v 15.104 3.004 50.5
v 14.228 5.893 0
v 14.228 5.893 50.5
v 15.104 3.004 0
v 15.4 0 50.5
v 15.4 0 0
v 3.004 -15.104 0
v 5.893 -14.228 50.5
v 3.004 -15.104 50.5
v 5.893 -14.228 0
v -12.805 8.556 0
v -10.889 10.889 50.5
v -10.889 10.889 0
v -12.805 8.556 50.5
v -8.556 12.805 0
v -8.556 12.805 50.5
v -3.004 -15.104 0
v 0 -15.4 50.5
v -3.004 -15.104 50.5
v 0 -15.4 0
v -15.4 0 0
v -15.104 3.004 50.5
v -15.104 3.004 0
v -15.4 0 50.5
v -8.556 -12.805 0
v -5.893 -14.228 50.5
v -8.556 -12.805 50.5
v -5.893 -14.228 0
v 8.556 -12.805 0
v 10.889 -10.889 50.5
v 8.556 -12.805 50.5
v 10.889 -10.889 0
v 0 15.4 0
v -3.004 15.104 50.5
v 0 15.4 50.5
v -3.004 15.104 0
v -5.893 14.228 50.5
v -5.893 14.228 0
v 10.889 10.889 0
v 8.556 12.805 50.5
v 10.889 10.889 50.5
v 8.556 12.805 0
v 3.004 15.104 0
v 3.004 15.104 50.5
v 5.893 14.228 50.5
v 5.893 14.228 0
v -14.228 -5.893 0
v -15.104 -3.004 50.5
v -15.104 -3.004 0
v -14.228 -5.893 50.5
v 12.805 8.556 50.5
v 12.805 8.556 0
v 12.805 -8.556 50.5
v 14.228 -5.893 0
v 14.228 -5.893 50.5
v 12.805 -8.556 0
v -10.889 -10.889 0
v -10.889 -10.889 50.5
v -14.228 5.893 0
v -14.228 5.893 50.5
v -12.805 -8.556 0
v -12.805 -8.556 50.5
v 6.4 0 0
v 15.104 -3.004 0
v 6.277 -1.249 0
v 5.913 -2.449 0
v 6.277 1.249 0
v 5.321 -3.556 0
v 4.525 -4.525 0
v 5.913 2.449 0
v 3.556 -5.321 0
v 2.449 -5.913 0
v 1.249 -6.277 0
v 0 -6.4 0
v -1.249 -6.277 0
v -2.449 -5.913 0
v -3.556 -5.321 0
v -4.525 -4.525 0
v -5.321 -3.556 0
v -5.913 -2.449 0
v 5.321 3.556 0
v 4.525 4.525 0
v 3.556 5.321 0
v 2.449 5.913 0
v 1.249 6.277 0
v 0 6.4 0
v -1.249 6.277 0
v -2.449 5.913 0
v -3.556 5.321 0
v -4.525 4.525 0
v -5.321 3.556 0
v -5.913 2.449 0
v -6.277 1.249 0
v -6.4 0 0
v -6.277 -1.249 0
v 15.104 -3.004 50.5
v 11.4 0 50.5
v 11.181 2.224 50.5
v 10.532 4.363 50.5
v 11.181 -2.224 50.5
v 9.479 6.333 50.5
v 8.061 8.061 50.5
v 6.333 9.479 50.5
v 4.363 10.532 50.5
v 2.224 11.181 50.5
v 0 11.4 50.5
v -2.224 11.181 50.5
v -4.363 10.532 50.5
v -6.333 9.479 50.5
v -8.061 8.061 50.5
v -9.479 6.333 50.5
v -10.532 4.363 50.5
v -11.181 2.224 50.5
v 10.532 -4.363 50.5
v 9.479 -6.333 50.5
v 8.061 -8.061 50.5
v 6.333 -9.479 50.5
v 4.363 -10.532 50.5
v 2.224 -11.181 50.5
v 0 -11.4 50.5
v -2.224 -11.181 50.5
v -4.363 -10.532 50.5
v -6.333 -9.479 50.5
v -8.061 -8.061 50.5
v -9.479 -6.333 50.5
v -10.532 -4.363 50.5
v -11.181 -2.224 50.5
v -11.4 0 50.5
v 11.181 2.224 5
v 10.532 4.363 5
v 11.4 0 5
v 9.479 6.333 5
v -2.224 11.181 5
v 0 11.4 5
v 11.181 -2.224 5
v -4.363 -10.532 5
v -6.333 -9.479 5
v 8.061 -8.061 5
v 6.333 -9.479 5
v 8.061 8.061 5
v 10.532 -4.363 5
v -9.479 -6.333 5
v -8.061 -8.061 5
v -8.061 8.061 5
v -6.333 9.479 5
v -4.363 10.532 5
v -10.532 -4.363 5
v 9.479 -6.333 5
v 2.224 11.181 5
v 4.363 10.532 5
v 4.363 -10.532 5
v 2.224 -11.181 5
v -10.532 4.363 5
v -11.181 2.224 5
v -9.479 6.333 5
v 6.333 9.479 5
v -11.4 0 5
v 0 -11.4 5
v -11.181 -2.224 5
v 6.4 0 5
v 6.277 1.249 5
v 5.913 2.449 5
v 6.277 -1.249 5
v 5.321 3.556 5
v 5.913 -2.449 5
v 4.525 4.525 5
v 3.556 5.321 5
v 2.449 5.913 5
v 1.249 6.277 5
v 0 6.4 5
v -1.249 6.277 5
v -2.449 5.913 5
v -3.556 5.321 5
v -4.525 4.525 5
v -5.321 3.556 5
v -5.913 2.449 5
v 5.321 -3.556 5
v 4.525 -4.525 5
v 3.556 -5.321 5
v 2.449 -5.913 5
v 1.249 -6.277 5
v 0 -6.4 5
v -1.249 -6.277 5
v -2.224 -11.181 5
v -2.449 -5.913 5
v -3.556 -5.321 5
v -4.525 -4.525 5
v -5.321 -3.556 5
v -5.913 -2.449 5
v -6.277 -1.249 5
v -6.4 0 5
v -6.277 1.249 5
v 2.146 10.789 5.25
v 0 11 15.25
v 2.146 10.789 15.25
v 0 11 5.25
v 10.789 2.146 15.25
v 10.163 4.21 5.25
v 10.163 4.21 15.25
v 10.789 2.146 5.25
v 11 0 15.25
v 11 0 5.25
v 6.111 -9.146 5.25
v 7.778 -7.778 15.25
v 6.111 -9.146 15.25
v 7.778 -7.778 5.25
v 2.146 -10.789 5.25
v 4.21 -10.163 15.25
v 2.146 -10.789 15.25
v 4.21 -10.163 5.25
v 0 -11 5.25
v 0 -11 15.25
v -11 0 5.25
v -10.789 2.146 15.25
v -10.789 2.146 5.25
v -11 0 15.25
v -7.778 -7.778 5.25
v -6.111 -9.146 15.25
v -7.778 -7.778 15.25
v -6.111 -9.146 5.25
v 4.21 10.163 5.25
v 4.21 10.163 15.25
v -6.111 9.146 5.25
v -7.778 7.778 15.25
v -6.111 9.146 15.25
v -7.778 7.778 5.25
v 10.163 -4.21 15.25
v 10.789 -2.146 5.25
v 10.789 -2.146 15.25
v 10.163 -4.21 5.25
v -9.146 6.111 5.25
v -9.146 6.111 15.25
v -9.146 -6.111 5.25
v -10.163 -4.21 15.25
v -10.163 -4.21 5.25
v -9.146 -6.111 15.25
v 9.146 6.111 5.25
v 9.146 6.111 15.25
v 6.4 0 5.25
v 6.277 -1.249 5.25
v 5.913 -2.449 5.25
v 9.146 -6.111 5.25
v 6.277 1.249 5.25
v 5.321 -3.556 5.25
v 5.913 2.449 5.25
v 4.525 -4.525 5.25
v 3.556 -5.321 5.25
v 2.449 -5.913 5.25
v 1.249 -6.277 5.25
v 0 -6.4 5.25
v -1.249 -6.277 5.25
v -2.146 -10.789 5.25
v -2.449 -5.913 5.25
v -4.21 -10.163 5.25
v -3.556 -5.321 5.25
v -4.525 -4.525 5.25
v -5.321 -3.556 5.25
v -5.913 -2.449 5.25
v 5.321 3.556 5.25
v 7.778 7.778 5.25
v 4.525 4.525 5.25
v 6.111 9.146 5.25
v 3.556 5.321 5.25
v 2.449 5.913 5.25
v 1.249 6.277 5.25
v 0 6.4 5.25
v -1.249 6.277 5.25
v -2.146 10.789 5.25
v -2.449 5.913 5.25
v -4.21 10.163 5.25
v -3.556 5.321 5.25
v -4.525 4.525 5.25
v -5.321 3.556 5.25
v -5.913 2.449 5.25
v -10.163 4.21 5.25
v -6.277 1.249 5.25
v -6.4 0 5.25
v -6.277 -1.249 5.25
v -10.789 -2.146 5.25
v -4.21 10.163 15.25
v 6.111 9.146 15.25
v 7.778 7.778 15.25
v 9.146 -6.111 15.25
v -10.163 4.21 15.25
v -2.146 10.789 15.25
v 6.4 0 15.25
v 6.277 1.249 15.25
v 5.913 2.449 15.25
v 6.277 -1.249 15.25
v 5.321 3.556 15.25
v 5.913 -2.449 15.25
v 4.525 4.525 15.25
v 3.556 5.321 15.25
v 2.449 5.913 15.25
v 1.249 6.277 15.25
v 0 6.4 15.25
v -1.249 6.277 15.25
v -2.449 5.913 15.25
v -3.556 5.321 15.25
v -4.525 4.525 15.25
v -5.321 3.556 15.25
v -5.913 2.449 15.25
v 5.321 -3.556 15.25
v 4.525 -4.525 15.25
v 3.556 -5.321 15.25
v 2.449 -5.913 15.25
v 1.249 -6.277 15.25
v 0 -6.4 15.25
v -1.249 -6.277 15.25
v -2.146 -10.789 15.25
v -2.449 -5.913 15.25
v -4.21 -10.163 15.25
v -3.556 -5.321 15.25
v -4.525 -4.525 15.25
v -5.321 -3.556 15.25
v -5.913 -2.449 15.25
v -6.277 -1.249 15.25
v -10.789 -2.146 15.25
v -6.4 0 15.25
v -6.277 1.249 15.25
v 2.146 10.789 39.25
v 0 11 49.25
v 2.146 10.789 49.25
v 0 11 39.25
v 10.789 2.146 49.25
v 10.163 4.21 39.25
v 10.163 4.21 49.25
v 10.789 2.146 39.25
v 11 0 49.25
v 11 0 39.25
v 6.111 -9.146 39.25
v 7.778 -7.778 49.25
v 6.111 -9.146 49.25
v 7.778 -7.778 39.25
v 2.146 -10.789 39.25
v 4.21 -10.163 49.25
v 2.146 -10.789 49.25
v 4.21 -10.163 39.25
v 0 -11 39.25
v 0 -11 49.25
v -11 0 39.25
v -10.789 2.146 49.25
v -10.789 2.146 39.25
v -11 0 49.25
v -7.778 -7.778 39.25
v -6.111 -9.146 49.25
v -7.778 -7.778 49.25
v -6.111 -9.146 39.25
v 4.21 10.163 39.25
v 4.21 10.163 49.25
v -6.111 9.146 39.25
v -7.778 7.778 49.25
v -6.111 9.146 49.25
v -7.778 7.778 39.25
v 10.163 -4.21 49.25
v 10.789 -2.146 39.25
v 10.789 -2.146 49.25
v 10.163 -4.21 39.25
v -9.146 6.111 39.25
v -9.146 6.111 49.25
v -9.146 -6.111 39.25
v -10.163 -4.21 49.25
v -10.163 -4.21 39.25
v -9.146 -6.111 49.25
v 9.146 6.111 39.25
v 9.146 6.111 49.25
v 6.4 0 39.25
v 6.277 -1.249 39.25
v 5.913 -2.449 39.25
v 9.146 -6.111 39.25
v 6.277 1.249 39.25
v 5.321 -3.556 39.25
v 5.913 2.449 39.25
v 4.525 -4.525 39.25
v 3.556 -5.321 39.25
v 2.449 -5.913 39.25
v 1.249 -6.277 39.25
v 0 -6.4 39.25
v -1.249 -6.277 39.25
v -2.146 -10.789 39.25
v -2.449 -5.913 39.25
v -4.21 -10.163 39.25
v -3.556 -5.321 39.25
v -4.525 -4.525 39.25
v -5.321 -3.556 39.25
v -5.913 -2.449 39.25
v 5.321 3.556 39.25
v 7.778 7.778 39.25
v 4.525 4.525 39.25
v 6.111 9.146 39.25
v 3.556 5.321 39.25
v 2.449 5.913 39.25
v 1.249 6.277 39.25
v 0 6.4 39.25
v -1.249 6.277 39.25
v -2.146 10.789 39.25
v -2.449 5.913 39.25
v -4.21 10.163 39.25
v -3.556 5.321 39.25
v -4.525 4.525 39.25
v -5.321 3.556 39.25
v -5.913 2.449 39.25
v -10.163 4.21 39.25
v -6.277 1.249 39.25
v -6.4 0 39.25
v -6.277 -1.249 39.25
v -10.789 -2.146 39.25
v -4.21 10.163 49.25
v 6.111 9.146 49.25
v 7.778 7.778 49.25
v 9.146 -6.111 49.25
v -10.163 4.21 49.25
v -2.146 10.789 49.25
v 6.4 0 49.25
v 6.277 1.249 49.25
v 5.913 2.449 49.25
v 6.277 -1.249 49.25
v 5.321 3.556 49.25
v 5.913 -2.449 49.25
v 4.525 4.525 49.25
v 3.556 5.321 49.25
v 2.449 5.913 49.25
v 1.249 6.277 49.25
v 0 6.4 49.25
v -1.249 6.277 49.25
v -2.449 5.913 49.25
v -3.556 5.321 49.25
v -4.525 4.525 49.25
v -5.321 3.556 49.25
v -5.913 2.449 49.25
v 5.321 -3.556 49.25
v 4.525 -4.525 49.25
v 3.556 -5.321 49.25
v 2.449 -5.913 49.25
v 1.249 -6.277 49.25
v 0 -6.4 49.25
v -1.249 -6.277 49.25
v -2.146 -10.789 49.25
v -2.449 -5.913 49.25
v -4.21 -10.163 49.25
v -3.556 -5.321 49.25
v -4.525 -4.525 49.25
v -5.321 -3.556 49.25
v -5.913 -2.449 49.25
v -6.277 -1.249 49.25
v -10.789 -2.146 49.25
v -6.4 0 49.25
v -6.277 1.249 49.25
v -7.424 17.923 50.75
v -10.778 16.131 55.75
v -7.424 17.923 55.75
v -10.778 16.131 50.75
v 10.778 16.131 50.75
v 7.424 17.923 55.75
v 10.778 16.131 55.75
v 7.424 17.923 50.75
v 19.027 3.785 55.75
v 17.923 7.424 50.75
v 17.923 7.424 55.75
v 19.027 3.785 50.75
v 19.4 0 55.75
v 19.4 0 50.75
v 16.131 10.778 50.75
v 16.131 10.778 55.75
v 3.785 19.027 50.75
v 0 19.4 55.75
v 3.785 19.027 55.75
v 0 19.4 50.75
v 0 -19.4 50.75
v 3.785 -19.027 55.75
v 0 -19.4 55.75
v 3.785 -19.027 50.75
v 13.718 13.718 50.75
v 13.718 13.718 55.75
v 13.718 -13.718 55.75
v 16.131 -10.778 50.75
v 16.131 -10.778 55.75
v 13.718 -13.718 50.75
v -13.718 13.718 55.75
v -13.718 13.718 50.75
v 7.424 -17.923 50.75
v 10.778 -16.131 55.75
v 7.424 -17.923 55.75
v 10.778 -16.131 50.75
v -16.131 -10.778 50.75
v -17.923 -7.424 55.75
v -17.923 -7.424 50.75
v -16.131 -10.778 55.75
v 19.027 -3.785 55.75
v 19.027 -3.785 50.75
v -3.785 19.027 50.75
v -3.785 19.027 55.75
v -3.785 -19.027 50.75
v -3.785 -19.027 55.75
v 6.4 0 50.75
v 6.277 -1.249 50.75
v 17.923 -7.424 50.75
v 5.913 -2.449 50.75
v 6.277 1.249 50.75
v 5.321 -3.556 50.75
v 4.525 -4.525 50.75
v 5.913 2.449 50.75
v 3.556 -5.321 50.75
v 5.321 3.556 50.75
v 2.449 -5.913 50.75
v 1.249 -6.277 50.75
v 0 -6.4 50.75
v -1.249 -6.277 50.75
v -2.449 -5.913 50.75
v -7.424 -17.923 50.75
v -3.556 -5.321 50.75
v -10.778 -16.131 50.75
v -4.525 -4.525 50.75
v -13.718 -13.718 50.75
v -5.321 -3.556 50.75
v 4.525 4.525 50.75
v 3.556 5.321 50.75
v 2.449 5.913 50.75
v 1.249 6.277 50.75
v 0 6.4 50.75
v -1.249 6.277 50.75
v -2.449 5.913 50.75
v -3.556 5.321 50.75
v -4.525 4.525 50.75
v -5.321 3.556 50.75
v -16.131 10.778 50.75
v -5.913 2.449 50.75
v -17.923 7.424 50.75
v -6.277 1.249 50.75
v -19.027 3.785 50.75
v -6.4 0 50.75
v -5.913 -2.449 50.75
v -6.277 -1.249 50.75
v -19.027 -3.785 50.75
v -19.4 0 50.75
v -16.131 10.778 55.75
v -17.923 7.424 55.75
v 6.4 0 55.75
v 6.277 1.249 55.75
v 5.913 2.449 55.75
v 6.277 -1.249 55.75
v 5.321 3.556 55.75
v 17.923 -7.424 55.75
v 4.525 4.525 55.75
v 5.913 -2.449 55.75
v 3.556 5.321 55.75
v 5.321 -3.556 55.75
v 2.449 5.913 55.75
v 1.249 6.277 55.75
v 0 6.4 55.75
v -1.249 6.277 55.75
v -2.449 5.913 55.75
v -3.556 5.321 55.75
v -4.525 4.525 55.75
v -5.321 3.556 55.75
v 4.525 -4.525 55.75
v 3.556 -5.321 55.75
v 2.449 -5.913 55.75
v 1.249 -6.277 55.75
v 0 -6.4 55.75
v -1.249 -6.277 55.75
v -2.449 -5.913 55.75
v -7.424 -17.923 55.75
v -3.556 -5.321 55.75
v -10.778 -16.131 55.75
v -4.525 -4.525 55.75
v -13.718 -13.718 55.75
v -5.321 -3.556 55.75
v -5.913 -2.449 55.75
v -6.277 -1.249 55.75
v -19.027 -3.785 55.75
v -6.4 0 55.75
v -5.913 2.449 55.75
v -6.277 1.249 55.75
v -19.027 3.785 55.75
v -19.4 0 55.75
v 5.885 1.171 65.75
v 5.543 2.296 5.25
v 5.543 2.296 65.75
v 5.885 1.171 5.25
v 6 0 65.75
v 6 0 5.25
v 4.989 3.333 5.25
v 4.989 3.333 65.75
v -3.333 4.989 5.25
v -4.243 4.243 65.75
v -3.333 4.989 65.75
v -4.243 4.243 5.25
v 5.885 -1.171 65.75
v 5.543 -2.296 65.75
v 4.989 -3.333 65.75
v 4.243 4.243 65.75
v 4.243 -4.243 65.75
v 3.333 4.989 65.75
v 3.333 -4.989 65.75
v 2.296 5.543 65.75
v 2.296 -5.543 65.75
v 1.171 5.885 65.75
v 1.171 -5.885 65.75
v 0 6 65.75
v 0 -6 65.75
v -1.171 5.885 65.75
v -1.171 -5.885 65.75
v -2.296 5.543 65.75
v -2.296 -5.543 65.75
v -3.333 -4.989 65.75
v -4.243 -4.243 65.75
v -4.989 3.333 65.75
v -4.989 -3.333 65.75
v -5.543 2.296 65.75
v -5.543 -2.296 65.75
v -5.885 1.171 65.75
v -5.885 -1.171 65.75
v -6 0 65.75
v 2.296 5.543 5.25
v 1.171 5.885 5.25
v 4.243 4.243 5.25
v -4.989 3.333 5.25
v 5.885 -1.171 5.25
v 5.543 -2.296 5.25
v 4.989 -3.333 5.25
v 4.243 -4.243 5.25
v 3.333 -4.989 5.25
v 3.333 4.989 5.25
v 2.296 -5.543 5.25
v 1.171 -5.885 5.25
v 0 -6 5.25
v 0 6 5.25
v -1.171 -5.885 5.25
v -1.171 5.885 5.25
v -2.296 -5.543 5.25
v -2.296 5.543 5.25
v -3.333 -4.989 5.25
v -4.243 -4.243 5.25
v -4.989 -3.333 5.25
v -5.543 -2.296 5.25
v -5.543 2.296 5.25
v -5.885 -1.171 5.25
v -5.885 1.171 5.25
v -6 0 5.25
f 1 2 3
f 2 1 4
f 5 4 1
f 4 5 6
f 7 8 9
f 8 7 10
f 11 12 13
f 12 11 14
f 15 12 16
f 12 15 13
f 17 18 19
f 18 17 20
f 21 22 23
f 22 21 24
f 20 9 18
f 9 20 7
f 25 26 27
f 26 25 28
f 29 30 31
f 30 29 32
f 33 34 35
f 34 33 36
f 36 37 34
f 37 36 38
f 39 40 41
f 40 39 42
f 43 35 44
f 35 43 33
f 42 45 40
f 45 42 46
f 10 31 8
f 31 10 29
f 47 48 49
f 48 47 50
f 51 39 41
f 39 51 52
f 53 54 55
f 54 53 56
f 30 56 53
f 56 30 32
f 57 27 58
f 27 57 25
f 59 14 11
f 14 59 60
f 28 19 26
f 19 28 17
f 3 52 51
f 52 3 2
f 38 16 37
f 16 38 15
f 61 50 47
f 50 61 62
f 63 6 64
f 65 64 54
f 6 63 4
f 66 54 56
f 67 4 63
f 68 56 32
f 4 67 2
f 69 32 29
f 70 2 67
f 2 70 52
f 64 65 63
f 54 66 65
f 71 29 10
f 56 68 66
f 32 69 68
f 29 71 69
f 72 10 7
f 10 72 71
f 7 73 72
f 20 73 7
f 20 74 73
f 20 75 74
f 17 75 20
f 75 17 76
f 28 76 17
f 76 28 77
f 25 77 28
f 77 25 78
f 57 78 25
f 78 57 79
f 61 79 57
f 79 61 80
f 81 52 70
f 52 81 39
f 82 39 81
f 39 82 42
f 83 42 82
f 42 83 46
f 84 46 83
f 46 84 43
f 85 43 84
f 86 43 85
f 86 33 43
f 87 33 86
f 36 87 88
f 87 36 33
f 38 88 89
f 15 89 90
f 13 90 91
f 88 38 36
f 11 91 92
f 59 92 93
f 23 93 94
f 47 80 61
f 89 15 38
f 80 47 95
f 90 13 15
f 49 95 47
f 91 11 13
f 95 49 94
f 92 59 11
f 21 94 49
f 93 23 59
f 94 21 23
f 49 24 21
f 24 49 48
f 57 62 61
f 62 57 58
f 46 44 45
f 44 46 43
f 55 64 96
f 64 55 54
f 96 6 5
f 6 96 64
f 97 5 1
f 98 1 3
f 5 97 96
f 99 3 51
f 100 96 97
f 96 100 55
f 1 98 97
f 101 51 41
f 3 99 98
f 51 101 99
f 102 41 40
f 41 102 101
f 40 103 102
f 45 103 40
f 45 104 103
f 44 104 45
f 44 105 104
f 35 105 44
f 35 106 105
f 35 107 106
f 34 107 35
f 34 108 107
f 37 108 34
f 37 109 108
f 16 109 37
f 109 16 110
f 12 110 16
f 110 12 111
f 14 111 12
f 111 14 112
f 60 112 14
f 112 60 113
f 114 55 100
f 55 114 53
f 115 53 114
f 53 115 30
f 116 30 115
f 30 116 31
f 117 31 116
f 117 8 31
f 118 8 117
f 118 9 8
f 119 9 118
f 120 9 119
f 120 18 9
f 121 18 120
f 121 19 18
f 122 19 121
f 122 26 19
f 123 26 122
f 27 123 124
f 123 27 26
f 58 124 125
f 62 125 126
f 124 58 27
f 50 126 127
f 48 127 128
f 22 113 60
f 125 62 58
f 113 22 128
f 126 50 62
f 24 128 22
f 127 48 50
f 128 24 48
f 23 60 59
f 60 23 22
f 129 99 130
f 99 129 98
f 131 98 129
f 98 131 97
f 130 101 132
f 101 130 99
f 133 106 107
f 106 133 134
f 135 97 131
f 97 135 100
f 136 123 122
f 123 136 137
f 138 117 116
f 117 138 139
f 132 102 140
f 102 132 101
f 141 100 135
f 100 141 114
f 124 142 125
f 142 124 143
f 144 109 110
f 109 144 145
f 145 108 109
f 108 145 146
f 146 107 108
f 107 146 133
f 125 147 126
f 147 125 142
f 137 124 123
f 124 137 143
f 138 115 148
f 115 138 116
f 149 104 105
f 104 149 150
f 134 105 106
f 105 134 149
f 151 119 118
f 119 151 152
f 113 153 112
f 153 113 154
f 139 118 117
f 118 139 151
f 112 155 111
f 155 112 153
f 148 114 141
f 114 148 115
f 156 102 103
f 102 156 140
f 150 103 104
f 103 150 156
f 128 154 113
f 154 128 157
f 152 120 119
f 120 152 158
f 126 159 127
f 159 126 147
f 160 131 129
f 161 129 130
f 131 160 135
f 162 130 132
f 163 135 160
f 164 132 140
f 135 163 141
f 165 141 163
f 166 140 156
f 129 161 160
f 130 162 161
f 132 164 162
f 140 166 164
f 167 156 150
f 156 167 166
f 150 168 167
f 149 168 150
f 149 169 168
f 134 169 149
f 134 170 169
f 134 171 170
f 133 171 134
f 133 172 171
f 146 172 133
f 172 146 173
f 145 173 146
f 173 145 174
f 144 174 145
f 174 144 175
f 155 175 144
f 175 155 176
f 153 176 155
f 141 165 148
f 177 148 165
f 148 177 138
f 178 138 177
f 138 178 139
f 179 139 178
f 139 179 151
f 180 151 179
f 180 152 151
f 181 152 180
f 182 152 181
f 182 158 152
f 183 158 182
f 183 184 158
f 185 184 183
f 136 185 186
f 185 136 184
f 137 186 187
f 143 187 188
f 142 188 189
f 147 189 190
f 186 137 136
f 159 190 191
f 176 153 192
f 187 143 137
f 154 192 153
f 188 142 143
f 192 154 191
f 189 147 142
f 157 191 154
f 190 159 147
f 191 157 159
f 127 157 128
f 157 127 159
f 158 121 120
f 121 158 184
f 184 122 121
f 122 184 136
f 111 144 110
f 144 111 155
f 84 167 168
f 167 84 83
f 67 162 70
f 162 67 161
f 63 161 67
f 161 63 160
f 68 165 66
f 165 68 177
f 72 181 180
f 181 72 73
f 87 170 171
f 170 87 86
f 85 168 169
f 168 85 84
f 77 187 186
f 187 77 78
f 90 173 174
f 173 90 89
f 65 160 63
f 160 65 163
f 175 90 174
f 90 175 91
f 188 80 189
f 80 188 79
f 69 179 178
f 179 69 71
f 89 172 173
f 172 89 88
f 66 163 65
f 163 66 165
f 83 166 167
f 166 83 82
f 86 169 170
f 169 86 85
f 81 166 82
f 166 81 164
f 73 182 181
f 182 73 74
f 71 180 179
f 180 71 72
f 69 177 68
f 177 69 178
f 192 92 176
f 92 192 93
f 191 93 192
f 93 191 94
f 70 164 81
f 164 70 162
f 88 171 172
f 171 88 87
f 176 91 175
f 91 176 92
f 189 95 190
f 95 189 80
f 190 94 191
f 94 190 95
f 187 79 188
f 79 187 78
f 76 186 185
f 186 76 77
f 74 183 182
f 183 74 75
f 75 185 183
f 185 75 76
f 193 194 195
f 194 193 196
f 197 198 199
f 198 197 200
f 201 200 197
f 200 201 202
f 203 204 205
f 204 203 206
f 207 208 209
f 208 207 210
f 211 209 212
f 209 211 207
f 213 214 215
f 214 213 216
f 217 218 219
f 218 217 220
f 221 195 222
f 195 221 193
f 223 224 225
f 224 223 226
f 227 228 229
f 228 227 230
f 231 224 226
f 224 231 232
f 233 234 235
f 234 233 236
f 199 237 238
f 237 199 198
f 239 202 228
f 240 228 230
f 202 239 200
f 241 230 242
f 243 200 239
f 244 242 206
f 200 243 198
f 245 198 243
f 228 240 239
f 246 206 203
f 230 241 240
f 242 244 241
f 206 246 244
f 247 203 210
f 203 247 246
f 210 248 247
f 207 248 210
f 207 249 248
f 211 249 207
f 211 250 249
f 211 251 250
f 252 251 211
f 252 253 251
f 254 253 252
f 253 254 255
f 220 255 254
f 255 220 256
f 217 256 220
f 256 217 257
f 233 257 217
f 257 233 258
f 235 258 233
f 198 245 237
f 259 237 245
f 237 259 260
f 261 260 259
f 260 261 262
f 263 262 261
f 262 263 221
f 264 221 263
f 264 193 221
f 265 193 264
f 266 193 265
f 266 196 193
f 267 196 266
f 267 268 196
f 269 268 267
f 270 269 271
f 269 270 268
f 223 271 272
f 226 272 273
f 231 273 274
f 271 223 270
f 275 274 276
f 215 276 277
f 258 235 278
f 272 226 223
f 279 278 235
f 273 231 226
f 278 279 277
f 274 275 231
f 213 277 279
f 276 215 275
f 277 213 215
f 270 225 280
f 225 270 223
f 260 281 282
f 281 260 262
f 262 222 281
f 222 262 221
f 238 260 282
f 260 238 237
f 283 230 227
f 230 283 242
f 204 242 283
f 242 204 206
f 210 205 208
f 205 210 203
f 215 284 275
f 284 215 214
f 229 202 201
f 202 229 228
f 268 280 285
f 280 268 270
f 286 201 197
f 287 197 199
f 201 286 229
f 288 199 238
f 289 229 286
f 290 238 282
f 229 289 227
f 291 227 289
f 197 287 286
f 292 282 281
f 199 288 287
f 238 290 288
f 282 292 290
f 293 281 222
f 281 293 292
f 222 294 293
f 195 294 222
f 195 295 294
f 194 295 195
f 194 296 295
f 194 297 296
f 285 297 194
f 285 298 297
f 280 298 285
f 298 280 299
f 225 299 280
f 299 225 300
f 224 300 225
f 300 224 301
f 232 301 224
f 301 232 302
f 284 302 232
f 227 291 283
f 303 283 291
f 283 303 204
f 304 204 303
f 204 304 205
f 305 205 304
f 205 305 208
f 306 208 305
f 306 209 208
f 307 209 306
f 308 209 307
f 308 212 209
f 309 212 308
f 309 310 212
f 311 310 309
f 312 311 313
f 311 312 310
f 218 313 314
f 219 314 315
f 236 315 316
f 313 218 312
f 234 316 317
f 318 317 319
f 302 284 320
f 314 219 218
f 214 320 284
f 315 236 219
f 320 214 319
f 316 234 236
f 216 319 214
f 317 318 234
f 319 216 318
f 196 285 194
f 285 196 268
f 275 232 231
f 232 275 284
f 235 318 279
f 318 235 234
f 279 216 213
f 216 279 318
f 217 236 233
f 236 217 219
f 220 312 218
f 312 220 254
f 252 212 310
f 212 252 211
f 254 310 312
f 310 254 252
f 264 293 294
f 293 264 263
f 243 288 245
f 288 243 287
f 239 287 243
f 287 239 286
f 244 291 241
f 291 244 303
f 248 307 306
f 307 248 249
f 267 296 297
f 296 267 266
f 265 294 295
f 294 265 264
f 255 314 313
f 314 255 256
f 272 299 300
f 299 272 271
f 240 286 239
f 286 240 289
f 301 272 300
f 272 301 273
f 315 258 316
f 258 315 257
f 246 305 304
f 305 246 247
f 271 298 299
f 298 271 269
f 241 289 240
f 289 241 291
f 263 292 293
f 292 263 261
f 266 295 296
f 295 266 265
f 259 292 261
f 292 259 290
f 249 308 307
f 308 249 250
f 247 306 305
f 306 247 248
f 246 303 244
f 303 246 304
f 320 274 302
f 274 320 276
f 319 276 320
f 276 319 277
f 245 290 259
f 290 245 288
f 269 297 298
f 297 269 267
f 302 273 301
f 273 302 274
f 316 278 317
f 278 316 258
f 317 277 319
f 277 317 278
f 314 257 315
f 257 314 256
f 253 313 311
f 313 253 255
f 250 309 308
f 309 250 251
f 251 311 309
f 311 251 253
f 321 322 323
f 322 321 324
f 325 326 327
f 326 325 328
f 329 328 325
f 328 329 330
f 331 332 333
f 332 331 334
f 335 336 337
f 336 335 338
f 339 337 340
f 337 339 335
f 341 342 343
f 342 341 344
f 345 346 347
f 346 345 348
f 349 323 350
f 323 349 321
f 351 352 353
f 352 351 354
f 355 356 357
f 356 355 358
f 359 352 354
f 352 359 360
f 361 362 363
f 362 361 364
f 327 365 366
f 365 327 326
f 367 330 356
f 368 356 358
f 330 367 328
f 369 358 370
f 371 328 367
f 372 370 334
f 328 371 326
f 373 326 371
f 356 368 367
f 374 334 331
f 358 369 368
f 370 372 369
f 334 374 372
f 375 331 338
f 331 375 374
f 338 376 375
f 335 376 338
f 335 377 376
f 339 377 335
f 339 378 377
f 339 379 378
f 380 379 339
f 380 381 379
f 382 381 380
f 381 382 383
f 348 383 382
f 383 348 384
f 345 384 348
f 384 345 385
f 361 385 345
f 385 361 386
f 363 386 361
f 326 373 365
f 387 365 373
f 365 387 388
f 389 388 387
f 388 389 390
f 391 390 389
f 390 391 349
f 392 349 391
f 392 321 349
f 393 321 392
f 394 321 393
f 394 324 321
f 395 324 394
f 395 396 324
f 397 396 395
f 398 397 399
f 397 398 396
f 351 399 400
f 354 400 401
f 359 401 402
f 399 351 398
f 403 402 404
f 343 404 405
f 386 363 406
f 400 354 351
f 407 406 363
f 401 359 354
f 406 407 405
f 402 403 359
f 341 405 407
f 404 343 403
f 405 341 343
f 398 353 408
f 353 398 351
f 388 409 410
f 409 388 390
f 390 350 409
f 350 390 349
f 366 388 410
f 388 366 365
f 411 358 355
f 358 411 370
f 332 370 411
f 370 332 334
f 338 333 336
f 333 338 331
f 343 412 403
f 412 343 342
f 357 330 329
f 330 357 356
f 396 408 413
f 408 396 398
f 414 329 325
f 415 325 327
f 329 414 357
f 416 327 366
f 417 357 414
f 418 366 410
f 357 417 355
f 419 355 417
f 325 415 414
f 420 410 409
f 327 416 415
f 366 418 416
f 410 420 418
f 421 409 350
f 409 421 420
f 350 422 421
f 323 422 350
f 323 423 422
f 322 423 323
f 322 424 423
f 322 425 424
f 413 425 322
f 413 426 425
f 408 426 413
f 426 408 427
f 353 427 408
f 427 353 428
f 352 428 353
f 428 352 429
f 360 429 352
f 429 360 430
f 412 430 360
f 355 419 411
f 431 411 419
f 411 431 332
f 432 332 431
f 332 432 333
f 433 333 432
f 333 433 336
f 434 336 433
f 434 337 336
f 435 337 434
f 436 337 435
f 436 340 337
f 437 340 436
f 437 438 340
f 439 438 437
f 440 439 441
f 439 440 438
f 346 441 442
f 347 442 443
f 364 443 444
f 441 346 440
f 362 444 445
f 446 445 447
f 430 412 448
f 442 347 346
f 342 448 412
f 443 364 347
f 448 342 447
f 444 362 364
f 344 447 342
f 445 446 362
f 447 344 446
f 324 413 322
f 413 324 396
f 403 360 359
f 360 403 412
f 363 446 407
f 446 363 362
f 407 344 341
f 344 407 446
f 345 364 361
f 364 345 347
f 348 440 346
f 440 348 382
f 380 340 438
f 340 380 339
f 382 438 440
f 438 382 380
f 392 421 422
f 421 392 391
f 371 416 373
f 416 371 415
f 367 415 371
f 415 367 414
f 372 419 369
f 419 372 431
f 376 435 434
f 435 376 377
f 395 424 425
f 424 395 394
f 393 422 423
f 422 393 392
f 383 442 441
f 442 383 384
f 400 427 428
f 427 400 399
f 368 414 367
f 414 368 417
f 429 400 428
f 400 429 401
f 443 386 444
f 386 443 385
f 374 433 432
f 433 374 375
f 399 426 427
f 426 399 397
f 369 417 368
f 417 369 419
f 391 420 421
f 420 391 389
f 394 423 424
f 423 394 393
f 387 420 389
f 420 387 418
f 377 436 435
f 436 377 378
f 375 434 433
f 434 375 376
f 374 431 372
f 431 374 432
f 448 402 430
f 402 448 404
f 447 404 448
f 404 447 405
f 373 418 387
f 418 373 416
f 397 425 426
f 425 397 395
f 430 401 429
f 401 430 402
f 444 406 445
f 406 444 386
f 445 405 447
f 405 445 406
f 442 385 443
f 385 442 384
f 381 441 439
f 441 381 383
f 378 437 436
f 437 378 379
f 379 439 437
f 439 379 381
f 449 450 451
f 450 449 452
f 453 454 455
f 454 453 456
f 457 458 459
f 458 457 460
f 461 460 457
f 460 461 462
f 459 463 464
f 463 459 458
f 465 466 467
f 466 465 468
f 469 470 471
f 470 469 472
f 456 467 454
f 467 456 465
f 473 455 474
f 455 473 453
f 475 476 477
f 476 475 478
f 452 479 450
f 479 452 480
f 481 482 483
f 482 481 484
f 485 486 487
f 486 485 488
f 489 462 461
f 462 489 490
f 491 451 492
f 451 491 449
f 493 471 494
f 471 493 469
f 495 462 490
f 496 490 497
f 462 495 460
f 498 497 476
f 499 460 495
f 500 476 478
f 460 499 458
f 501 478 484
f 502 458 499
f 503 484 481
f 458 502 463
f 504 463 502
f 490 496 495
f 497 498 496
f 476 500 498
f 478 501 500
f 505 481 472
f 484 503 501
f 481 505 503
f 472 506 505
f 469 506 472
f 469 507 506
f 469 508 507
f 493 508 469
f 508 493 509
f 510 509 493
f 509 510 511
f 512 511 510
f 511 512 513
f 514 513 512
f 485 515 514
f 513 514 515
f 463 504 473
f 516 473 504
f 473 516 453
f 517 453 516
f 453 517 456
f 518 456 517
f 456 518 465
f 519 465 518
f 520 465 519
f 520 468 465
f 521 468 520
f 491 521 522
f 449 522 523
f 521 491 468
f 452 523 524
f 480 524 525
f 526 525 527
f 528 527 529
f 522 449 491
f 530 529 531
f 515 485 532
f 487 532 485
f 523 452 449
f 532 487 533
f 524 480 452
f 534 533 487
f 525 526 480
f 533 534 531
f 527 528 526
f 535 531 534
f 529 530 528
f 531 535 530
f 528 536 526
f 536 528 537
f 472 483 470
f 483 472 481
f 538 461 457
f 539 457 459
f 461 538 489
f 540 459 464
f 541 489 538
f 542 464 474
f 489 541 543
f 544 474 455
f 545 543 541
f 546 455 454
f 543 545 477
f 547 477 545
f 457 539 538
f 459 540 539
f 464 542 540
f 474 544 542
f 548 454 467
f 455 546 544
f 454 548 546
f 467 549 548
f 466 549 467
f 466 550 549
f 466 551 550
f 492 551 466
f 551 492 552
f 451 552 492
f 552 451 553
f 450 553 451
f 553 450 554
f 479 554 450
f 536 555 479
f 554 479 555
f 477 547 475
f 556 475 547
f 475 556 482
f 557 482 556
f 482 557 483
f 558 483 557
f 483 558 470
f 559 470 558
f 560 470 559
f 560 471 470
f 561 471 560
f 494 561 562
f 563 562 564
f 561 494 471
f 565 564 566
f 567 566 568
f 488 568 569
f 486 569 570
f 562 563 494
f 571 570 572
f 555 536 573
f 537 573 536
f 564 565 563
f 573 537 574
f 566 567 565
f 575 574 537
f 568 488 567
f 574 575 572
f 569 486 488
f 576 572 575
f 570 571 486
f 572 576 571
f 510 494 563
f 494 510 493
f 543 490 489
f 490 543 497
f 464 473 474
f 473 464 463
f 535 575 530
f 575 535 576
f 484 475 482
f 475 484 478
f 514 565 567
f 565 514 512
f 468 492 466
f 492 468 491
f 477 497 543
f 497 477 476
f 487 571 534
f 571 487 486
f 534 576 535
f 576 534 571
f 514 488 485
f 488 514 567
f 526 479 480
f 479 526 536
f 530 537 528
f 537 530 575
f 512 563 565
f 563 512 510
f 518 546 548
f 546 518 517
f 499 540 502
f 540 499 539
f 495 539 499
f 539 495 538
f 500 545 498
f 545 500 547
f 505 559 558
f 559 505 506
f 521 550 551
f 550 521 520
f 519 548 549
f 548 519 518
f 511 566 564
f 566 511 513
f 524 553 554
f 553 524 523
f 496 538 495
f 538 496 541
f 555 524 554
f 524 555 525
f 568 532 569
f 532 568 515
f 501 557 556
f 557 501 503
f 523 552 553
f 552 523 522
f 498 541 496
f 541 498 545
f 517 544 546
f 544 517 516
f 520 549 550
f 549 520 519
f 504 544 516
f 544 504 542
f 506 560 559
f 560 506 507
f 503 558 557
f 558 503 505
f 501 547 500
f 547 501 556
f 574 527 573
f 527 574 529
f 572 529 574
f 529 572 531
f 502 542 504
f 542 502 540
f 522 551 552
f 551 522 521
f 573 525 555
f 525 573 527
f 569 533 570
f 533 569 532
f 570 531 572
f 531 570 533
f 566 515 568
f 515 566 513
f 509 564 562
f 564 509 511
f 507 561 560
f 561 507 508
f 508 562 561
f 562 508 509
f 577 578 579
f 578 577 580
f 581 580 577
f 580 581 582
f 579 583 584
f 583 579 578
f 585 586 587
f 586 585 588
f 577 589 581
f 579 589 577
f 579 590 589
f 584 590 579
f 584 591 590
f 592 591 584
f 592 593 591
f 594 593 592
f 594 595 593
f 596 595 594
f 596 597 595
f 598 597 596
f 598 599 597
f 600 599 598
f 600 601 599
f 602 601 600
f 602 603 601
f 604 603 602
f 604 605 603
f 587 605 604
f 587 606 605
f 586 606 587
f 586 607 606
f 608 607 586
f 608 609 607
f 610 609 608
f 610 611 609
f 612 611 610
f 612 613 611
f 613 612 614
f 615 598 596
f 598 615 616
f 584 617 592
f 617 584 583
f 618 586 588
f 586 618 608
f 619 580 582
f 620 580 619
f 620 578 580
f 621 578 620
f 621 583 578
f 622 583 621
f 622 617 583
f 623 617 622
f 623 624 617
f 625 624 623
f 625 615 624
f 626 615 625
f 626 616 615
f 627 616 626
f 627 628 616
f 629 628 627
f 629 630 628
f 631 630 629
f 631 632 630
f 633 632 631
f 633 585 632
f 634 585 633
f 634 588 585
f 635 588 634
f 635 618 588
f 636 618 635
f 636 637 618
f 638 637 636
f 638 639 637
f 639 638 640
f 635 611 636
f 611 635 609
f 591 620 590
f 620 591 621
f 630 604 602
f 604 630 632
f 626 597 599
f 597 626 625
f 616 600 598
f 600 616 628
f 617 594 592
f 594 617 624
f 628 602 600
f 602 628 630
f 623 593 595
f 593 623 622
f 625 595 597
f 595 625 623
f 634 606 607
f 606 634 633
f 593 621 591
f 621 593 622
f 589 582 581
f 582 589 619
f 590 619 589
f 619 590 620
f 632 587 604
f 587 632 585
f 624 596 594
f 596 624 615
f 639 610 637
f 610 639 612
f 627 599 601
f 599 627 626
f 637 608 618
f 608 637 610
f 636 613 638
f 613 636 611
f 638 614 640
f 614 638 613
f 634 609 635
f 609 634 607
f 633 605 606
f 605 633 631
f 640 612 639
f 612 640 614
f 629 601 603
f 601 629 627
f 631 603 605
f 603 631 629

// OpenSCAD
$fn = 32;

// ------------------------------------------------------------------------
// Shaft station: cup d30.8 x 50.5 mm, shaft d12
// Every part is its own module, assembly() places every instance.
// ------------------------------------------------------------------------

// --- part 1 ---
module housing_cup() {
  difference() {
    cylinder(h = 50.5, d = 30.8);
    translate([0, 0, 5]) cylinder(h = 46.5, d = 22.8);
    translate([0, 0, -1]) cylinder(h = 7, d = 12.8);
  }
}

// --- part 2 ---
module bearing_lower() {
  difference() {
      translate([0, 0, 0]) cylinder(h = 10, d = 22);
      translate([0, 0, -1]) cylinder(h = 12, d = 12.8);
    }
}

// --- part 3 ---
module bearing_upper() {
  difference() {
      translate([0, 0, 0]) cylinder(h = 10, d = 22);
      translate([0, 0, -1]) cylinder(h = 12, d = 12.8);
    }
}

// --- part 4 ---
module station_shaft() {
  translate([0, 0, -30.25]) cylinder(h = 60.5, d = 12);
}

// --- part 5 ---
module station_cover() {
  difference() {
    cylinder(h = 5, d = 38.8);
    translate([0, 0, -1]) cylinder(h = 7, d = 12.8);
  }
}

// --- assembly ---
module assembly() {
  color([0.80, 0.24, 0.20]) translate([0, 0, 0]) rotate([0, 0, 0]) housing_cup();
  color([0.20, 0.45, 0.75]) translate([0, 0, 5.25]) rotate([0, 0, 0]) bearing_lower();
  color([0.25, 0.62, 0.32]) translate([0, 0, 39.25]) rotate([0, 0, 0]) bearing_upper();
  color([0.92, 0.70, 0.18]) translate([0, 0, 35.5]) rotate([0, 0, 0]) station_shaft();
  color([0.58, 0.35, 0.70]) translate([0, 0, 50.75]) rotate([0, 0, 0]) station_cover();
}

assembly();
